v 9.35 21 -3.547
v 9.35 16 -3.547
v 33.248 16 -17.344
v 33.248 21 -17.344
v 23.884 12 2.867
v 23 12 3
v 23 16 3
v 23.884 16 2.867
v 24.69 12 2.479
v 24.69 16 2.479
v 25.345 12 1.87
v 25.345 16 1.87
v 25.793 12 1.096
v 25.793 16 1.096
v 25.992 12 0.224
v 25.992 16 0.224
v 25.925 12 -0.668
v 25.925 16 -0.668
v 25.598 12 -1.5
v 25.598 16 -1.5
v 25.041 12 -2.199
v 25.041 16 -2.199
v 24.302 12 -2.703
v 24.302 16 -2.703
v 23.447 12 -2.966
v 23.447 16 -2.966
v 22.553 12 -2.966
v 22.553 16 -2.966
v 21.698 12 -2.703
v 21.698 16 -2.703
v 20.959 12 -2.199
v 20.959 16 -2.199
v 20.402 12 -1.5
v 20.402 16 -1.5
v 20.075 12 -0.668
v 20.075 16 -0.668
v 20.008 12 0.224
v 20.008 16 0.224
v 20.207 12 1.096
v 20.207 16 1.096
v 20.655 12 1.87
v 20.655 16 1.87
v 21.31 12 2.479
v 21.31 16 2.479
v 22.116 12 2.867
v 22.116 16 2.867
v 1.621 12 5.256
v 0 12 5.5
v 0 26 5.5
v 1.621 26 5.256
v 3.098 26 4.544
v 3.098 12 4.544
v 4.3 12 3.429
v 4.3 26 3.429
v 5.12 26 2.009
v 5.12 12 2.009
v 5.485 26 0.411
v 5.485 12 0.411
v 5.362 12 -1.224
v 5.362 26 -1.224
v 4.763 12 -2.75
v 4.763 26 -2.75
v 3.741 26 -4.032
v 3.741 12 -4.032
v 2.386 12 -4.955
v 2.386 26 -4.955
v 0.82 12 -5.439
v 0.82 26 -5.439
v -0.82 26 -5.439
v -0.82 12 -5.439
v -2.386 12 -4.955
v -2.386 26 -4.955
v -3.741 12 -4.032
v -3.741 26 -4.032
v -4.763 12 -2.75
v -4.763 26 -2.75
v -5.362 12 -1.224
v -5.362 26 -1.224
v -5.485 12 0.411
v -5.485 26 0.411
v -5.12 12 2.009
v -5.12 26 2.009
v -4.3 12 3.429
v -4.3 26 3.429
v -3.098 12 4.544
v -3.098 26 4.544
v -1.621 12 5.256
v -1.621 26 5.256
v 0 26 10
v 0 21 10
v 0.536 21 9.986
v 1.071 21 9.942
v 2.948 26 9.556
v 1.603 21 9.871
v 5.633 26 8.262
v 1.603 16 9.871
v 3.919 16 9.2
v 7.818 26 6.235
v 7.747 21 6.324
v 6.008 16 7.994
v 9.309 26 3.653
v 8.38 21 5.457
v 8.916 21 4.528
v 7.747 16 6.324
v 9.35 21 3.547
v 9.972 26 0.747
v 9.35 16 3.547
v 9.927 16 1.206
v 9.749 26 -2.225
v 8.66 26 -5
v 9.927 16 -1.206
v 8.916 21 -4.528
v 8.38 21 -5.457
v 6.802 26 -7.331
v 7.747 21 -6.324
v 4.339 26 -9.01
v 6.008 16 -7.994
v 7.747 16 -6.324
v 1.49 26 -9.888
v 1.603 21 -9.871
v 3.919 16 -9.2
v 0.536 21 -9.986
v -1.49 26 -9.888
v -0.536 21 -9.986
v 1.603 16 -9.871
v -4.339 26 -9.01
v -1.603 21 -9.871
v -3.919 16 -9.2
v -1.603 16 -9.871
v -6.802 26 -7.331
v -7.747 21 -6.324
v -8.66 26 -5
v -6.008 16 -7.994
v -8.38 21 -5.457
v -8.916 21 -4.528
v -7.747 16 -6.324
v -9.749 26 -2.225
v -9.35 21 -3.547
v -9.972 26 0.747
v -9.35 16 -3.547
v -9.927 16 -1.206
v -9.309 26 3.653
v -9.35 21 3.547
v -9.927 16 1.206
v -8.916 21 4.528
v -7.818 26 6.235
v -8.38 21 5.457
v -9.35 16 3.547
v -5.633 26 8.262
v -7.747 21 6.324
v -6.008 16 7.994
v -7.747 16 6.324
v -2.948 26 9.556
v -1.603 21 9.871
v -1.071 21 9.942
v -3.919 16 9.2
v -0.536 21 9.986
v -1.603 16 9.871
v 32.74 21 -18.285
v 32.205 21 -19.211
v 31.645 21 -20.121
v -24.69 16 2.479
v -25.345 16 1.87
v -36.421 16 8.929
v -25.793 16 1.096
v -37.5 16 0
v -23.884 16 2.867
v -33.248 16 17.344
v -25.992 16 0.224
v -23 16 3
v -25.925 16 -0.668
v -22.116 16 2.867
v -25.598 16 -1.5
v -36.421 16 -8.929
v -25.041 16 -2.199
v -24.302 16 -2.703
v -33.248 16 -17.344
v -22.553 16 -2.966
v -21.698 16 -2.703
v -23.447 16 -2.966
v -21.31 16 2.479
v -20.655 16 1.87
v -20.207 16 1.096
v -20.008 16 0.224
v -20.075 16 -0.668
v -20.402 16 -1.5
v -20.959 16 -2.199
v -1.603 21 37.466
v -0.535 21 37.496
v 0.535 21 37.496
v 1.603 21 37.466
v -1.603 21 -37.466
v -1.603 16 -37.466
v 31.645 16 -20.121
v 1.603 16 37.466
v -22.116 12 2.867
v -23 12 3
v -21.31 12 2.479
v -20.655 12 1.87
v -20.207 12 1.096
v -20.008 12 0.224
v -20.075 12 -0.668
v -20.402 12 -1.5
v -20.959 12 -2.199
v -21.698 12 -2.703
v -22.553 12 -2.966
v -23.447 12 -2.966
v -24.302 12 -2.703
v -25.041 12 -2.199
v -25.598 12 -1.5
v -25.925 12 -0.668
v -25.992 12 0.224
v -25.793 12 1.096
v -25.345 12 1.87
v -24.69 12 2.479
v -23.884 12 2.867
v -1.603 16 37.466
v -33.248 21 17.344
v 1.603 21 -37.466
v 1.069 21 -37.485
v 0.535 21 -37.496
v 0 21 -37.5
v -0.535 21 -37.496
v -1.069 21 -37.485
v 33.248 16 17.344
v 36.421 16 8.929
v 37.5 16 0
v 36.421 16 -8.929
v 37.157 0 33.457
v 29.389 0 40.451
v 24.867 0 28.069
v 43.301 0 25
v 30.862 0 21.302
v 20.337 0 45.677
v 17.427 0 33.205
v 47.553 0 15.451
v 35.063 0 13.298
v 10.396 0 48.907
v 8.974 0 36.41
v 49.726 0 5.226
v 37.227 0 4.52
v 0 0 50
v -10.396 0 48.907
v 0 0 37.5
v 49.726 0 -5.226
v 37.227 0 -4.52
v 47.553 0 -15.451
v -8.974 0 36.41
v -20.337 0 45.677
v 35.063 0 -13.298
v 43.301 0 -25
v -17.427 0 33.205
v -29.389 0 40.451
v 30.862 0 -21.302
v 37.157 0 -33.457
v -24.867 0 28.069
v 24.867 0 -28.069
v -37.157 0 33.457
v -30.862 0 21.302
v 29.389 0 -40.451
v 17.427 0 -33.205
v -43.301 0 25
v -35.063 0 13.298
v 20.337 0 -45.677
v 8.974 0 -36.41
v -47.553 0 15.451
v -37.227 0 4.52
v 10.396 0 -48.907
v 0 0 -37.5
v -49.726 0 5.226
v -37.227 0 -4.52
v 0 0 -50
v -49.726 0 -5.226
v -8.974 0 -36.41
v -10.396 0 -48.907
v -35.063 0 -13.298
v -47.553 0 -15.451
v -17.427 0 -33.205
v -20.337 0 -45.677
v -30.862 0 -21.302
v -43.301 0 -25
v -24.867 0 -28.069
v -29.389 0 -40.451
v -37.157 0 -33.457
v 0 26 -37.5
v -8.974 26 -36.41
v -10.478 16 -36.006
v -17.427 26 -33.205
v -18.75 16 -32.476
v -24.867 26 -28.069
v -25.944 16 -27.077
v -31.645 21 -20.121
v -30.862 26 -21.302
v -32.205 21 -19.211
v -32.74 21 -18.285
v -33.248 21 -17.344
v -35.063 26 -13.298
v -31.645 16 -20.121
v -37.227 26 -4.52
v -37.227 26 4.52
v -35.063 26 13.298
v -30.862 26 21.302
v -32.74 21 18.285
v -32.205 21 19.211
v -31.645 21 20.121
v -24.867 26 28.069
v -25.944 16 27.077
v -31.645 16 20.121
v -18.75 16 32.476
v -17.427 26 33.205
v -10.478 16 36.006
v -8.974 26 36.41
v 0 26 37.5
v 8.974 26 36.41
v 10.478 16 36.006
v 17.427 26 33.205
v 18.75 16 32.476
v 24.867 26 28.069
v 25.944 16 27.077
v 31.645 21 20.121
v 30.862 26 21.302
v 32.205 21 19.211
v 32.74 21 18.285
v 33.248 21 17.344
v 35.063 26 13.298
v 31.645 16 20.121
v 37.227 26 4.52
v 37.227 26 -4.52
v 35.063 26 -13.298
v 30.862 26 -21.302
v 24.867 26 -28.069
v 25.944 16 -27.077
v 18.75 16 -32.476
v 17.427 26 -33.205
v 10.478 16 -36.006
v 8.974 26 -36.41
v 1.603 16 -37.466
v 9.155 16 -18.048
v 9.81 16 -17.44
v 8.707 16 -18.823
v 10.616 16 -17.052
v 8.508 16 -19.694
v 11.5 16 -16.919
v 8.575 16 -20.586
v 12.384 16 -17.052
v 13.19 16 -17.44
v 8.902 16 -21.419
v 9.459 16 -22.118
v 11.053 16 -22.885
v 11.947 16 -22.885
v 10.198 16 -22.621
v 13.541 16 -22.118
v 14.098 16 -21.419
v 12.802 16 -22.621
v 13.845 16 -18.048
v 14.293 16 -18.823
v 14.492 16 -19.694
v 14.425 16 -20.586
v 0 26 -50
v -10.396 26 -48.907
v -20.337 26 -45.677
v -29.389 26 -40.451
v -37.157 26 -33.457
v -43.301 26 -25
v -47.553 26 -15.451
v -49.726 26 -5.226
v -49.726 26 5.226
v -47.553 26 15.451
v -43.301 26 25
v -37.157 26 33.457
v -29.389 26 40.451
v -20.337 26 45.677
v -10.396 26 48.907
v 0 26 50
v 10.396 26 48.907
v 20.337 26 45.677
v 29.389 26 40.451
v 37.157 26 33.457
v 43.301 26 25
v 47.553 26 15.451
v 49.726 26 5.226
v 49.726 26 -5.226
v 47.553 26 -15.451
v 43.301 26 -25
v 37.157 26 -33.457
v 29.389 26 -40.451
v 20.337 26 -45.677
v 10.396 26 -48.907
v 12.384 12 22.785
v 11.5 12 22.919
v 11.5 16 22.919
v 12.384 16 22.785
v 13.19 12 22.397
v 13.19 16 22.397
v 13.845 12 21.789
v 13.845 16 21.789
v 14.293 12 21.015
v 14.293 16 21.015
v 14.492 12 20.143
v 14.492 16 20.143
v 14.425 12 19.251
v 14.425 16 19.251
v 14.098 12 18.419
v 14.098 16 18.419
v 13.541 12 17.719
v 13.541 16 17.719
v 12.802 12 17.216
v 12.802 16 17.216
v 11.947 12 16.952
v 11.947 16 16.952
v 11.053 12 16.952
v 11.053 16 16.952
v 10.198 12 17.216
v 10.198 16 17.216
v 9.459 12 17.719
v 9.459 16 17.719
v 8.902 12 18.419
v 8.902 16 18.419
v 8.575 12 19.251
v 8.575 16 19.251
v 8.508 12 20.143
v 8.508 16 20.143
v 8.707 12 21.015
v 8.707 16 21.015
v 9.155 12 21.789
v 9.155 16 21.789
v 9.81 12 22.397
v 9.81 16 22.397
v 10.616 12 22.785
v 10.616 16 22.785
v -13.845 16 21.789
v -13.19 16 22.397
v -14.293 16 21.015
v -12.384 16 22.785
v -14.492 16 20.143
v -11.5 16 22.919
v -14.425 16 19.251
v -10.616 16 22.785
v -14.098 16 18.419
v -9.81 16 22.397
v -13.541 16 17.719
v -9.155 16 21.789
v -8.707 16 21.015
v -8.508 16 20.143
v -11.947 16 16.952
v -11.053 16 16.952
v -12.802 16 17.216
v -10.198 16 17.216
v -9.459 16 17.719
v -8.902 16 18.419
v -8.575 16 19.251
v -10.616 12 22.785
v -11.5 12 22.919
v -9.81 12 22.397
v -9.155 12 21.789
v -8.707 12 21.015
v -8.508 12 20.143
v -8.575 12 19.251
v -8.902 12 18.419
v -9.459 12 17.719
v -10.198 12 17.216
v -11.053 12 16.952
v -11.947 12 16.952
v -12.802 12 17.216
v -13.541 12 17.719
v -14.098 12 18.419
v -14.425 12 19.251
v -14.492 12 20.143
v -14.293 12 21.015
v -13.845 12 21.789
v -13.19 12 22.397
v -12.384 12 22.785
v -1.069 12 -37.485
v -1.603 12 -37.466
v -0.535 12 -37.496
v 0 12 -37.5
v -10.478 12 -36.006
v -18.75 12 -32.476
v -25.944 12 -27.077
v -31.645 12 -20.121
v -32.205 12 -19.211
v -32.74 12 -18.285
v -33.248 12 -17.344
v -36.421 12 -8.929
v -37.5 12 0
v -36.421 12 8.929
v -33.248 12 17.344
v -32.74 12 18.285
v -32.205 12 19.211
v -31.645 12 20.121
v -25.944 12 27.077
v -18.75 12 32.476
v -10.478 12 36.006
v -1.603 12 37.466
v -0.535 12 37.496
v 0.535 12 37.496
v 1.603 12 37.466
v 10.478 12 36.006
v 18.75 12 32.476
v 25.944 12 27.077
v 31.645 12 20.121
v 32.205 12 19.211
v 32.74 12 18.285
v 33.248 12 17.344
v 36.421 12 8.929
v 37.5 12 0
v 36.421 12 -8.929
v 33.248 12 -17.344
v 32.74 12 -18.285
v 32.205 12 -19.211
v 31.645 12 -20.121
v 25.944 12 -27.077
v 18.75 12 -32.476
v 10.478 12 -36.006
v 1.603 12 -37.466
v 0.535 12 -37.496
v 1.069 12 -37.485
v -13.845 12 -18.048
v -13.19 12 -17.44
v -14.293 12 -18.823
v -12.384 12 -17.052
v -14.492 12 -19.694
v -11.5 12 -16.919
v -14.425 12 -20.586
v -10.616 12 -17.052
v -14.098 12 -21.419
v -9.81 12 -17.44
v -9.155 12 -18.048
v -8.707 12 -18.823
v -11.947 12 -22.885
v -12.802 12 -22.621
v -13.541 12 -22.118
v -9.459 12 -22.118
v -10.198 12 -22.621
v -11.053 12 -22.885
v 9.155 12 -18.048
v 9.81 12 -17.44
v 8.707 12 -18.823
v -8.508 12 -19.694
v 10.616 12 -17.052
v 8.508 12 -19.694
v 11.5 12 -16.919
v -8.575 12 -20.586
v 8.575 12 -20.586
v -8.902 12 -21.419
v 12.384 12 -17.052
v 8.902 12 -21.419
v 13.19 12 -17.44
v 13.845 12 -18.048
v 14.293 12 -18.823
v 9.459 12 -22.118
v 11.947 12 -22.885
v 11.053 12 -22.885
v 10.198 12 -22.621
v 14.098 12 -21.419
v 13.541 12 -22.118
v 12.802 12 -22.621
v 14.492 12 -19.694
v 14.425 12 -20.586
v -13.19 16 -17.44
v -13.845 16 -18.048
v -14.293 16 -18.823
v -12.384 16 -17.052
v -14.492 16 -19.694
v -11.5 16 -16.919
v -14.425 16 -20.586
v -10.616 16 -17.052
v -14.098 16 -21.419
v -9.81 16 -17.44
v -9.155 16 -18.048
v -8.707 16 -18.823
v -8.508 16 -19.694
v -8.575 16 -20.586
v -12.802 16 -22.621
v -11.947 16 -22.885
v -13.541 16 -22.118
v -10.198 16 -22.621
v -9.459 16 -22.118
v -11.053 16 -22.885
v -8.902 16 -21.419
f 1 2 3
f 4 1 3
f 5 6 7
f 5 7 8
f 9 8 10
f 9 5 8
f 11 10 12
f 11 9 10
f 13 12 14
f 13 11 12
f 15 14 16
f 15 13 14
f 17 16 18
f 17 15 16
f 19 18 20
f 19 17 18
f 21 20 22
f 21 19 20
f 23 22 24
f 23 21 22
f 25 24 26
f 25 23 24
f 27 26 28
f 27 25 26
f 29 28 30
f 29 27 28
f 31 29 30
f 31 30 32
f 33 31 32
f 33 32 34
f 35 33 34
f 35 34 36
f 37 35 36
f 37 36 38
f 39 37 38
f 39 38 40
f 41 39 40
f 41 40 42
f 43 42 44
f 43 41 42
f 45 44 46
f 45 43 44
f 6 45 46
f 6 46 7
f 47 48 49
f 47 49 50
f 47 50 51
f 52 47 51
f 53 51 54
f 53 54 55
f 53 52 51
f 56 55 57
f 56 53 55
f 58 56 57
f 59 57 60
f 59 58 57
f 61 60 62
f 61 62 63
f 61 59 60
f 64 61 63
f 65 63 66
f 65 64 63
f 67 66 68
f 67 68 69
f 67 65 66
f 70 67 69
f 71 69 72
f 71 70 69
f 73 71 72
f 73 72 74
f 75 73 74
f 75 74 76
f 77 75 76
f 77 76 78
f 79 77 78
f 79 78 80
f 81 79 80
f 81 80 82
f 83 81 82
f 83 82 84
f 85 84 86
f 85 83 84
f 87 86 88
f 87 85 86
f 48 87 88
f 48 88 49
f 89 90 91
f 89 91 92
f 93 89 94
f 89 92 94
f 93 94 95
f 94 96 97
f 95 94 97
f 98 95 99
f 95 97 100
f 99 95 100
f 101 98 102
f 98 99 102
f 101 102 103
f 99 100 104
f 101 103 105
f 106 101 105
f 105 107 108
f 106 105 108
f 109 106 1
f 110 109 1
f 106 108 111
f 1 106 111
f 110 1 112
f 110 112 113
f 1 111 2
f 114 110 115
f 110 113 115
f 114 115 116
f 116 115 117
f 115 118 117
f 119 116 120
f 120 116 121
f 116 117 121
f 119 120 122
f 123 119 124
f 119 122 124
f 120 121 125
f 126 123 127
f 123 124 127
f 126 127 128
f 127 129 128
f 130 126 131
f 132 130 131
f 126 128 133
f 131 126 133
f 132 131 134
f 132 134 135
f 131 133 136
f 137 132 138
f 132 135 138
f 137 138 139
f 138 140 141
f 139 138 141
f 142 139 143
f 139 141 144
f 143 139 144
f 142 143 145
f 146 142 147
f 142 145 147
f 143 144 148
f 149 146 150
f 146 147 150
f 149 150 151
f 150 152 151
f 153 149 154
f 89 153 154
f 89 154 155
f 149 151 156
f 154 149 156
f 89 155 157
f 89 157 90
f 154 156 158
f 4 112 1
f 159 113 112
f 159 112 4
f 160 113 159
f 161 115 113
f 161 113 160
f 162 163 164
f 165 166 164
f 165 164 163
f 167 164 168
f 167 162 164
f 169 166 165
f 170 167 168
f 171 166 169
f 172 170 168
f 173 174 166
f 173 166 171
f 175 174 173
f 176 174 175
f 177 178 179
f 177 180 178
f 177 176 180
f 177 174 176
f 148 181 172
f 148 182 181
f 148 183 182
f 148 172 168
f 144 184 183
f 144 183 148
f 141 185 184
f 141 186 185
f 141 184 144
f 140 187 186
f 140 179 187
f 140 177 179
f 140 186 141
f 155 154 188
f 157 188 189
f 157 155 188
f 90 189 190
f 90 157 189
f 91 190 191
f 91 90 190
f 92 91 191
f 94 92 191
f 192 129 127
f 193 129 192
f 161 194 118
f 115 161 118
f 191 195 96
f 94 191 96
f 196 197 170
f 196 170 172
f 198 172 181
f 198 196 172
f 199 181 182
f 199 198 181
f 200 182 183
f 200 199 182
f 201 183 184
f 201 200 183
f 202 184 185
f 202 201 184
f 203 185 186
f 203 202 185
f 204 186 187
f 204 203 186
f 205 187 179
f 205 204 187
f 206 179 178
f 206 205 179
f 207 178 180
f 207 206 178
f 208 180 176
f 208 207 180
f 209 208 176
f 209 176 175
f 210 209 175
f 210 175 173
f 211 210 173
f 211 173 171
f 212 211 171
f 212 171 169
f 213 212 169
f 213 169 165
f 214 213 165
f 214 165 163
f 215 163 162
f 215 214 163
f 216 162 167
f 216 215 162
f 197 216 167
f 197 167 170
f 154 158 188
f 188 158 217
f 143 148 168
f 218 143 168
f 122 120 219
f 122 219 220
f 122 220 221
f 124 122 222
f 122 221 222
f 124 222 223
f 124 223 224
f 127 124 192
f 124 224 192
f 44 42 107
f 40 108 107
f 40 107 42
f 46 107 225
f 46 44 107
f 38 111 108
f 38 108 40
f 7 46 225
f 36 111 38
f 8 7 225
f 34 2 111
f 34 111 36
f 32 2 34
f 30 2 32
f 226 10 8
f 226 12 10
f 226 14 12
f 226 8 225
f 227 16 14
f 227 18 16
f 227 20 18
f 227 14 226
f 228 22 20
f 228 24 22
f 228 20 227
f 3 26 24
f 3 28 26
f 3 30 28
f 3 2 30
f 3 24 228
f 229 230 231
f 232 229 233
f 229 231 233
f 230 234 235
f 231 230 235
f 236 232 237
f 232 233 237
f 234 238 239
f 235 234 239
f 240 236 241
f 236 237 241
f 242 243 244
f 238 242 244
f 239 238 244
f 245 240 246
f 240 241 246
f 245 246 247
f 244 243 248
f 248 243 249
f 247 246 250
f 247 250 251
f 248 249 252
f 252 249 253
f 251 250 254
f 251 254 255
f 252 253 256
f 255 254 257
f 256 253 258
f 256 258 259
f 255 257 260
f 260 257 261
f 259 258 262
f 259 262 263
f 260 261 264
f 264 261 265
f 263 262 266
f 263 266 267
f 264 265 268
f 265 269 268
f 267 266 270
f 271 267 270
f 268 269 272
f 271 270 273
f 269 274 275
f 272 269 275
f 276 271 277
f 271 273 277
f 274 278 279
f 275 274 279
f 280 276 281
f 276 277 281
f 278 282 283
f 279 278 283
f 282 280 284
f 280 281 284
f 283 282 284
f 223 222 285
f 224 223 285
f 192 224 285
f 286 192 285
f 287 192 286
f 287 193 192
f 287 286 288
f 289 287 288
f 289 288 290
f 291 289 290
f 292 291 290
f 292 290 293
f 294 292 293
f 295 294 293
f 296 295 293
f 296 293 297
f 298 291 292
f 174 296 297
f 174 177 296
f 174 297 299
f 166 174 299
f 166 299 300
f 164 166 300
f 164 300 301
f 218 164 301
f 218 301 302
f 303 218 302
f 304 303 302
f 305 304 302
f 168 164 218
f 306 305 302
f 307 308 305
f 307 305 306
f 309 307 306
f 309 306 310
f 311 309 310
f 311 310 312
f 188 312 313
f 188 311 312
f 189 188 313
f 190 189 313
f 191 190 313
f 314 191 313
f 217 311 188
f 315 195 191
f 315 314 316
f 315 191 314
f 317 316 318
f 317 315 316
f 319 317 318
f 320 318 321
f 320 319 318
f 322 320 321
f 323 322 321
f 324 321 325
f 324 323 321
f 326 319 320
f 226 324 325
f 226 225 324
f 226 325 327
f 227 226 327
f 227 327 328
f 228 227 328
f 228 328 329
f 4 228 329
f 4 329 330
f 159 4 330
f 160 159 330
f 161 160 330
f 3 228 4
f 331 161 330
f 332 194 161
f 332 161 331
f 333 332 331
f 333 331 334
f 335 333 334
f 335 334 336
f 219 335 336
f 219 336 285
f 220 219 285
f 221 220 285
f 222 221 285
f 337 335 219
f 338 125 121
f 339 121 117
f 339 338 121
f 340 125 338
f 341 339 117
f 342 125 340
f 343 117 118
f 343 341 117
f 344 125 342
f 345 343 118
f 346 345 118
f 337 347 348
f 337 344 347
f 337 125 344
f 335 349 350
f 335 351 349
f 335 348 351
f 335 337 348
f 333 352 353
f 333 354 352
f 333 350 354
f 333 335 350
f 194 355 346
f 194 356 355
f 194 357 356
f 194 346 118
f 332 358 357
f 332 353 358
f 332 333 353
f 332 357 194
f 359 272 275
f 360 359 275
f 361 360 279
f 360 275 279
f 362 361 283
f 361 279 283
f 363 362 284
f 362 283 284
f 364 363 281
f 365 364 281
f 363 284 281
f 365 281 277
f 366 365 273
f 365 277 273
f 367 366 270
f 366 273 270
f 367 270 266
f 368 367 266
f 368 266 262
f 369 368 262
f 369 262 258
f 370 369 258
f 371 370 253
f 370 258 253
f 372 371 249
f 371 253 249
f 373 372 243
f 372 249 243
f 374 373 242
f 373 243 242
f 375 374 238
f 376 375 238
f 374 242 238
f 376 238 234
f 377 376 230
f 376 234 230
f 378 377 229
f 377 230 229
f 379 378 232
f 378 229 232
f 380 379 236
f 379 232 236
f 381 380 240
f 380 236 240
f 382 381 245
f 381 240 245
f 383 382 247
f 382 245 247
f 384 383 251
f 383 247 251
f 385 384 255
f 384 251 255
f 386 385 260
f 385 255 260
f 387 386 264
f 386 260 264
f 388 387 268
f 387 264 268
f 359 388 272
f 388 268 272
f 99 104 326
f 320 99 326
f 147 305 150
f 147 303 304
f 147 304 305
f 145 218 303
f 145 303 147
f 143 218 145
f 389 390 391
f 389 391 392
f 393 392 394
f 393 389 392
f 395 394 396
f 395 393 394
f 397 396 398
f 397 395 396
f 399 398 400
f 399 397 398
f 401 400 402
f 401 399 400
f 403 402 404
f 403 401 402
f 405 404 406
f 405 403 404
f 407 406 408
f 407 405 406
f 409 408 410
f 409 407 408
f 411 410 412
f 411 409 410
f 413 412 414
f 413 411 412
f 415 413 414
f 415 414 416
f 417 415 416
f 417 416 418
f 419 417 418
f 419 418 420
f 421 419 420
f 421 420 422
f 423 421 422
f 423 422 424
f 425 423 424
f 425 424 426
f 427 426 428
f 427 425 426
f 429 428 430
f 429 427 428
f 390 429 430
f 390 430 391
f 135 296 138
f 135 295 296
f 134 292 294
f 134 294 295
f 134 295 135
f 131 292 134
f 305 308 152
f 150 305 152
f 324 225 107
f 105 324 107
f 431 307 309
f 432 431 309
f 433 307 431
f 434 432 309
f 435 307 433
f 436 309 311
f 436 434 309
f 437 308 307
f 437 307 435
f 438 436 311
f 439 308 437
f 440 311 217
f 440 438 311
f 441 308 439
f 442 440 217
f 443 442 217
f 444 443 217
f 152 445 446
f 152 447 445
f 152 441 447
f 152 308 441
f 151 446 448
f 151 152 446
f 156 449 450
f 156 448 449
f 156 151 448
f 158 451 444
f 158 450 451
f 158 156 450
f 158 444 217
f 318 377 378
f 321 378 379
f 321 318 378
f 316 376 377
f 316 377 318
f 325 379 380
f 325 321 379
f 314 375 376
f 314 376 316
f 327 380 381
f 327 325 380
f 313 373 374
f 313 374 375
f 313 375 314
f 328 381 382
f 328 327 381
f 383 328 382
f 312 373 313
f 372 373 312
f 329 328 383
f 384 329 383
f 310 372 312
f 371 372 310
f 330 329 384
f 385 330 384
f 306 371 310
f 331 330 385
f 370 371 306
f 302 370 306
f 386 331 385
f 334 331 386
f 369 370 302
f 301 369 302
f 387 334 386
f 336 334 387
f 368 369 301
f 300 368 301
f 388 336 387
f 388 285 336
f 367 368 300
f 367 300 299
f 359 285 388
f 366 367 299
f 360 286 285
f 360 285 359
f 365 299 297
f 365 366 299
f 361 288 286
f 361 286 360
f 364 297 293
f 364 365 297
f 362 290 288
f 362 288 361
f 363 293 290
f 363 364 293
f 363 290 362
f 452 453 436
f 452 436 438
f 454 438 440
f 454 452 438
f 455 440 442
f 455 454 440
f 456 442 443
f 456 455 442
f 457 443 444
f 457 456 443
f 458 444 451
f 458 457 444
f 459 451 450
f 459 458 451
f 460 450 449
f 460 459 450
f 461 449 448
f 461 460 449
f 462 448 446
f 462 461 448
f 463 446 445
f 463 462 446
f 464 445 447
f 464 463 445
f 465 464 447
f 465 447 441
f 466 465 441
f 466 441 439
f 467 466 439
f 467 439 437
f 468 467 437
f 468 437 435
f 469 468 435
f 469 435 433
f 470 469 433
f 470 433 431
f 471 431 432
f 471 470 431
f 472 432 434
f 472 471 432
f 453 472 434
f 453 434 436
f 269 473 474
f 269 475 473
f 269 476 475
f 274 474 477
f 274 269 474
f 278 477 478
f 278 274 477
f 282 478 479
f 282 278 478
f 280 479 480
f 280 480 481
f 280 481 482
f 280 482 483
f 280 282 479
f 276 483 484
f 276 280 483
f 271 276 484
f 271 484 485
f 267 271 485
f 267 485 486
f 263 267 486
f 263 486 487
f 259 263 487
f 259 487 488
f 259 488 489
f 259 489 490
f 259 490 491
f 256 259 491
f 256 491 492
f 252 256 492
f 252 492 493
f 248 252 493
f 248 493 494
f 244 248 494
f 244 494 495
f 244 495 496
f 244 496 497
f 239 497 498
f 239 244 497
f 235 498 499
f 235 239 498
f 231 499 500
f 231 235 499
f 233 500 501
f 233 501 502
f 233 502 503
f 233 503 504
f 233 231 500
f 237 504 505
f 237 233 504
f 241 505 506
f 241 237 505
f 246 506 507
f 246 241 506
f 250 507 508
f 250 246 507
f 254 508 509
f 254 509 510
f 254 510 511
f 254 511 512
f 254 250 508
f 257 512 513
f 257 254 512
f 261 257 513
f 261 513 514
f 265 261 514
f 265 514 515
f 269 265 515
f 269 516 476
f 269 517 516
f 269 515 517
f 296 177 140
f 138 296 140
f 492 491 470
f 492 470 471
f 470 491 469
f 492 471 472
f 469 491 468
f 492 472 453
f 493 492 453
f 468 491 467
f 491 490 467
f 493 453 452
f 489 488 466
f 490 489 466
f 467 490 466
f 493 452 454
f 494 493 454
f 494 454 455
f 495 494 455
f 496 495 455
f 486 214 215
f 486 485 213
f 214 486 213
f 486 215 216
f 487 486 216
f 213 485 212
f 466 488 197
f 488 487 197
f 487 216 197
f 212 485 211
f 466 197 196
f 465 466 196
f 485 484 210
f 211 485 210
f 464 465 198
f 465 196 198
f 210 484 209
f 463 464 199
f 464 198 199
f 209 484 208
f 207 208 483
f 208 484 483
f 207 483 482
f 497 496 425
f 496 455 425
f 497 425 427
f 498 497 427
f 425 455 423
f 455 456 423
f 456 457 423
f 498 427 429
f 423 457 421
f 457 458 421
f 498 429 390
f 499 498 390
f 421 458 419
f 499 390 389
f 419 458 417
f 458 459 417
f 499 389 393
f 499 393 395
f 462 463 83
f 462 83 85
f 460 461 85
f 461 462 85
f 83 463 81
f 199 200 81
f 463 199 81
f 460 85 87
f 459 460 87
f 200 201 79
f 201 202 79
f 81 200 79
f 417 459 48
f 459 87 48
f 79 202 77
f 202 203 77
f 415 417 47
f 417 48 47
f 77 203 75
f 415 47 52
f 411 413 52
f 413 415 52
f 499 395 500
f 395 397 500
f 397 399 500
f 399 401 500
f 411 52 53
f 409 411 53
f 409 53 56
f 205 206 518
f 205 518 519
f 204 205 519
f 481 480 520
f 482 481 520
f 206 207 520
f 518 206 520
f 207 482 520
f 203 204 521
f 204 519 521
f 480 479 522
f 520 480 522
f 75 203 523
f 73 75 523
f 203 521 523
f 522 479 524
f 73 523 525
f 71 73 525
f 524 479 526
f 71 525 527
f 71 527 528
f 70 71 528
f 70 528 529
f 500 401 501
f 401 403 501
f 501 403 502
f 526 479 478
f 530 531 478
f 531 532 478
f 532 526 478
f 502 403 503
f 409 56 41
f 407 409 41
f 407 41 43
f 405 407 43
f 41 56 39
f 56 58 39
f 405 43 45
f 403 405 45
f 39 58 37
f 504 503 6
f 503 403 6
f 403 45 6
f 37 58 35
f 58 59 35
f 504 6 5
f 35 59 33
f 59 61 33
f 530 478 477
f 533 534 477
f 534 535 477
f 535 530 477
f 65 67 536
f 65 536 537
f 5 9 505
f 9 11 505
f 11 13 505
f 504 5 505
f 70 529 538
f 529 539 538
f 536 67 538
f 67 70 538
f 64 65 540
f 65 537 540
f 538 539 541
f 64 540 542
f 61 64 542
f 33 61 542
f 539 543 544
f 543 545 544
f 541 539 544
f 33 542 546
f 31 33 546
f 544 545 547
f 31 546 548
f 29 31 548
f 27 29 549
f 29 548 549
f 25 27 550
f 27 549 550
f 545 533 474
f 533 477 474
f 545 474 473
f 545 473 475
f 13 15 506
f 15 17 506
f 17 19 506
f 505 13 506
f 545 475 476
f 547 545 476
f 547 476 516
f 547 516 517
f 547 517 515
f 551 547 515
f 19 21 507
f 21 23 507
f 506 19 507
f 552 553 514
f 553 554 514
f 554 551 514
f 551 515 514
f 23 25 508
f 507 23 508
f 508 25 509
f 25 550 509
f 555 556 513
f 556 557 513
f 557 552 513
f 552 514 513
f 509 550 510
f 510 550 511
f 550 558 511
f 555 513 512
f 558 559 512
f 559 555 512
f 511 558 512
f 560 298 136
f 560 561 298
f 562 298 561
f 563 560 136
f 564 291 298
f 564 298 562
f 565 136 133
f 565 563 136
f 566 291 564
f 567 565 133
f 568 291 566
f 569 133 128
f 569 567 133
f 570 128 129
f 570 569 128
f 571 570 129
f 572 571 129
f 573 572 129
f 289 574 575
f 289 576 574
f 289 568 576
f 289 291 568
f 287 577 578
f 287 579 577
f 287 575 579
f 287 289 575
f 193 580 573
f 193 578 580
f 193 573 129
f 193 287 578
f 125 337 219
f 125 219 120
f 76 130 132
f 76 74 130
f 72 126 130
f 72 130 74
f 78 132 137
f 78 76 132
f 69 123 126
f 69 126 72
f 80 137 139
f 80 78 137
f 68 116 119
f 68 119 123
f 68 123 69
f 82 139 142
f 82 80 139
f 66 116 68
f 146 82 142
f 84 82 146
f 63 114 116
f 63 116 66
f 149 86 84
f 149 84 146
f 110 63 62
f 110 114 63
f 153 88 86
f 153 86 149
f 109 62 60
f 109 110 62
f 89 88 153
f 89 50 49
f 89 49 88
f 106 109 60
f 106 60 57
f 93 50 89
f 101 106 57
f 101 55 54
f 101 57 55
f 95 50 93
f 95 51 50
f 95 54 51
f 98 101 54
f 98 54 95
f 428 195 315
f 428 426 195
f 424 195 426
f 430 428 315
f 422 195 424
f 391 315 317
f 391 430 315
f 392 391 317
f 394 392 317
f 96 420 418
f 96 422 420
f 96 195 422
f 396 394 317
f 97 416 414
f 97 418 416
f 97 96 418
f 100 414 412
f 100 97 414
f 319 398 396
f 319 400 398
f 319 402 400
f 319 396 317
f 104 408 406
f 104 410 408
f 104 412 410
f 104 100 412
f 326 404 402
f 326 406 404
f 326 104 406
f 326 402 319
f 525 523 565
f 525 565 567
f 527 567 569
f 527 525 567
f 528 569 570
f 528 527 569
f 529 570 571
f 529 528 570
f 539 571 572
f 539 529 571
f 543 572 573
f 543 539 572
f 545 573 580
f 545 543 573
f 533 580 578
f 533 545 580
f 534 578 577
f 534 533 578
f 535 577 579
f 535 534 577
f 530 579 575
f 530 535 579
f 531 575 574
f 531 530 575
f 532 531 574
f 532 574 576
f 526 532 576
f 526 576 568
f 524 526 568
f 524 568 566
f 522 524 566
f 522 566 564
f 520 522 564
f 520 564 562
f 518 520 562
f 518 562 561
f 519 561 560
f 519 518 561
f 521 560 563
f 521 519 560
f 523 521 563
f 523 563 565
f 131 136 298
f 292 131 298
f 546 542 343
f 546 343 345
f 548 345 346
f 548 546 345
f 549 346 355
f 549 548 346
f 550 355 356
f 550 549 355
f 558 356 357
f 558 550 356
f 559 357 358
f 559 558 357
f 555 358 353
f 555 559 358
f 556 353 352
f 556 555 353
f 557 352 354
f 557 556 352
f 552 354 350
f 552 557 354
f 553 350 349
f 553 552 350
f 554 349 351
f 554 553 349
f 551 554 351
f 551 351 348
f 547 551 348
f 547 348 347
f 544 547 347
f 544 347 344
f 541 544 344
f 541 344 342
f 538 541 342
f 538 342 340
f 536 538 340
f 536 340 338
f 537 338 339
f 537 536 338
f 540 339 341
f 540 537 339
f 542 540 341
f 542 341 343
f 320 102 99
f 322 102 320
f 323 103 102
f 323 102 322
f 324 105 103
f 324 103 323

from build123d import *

# Parameters (mm, degrees)
SKETCH1_R           = 50
SKETCH1_R_2         = 37.5
BOSS_EXTRUDE1_DEPTH = 26
BOSS_EXTRUDE3_DEPTH = 9
BOSS_EXTRUDE4_START = -14
SKETCH9_R           = 10
SKETCH9_R_2         = 5.5
BOSS_EXTRUDE4_DEPTH = 14
SKETCH10_R          = 3
BOSS_EXTRUDE5_DEPTH = 4


with BuildPart() as part:
    # Sketch1 → Boss-Extrude1 (new body)
    with BuildSketch(Plane(origin=(0, 0, 0), x_dir=(1, 0, 0), z_dir=(0, 1, 0))):
        with Locations(Location((0, 0, 0), (0, 0, 90))):
            Circle(SKETCH1_R)
        with Locations(Location((0, 0, 0), (0, 0, 90))):
            Circle(SKETCH1_R_2, mode=Mode.SUBTRACT)
    extrude(amount=BOSS_EXTRUDE1_DEPTH)

    # Sketch3 → Boss-Extrude3 (add)
    with BuildSketch(Plane(origin=(0, 12, 0), x_dir=(1, 0, 0), z_dir=(0, 1, 0))):
        with BuildLine():
            Line((1.603162061, 37.465715947), (1.603162061, 9.870657091))
            ThreePointArc((1.603162061, 9.870657091), (0, 10), (-1.603162061, 9.870657091))
            Line((-1.603162061, 9.870657091), (-1.603162061, 37.465715947))
            ThreePointArc((-1.603162061, 37.465715947), (0, 37.5), (1.603162061, 37.465715947))
        make_face()
        with BuildLine():
            Line((31.64468075, 20.121237045), (7.746658762, 6.323707617))
            ThreePointArc((7.746658762, 6.323707617), (8.660254038, 5), (9.349820823, 3.546949474))
            Line((9.349820823, 3.546949474), (33.247842811, 17.344478902))
            ThreePointArc((33.247842811, 17.344478902), (32.475952642, 18.75), (31.64468075, 20.121237045))
        make_face()
        with BuildLine():
            Line((33.247842811, -17.344478902), (9.349820823, -3.546949474))
            ThreePointArc((9.349820823, -3.546949474), (8.660254038, -5), (7.746658762, -6.323707617))
            Line((7.746658762, -6.323707617), (31.64468075, -20.121237045))
            ThreePointArc((31.64468075, -20.121237045), (32.475952642, -18.75), (33.247842811, -17.344478902))
        make_face()
        with BuildLine():
            Line((1.603162061, -37.465715947), (1.603162061, -9.870657091))
            ThreePointArc((1.603162061, -9.870657091), (0, -10), (-1.603162061, -9.870657091))
            Line((-1.603162061, -9.870657091), (-1.603162061, -37.465715947))
            ThreePointArc((-1.603162061, -37.465715947), (0, -37.5), (1.603162061, -37.465715947))
        make_face()
        with BuildLine():
            Line((-31.64468075, -20.121237045), (-7.746658762, -6.323707617))
            ThreePointArc((-7.746658762, -6.323707617), (-8.660254038, -5), (-9.349820823, -3.546949474))
            Line((-9.349820823, -3.546949474), (-33.247842811, -17.344478902))
            ThreePointArc((-33.247842811, -17.344478902), (-32.475952642, -18.75), (-31.64468075, -20.121237045))
        make_face()
        with BuildLine():
            Line((-33.247842811, 17.344478902), (-9.349820823, 3.546949474))
            ThreePointArc((-9.349820823, 3.546949474), (-8.660254038, 5), (-7.746658762, 6.323707617))
            Line((-7.746658762, 6.323707617), (-31.64468075, 20.121237045))
            ThreePointArc((-31.64468075, 20.121237045), (-32.475952642, 18.75), (-33.247842811, 17.344478902))
        make_face()
    extrude(amount=BOSS_EXTRUDE3_DEPTH)

    # Sketch9 → Boss-Extrude4 (add)
    with BuildSketch(Plane(origin=(0, 26, 0), x_dir=(1, 0, 0), z_dir=(0, 1, 0)).offset(BOSS_EXTRUDE4_START)):
        with Locations(Location((0, 0, 0), (0, 0, 270))):
            Circle(SKETCH9_R)
        with Locations(Location((0, 0, 0), (0, 0, 270))):
            Circle(SKETCH9_R_2, mode=Mode.SUBTRACT)
    extrude(amount=BOSS_EXTRUDE4_DEPTH)

    # Sketch10 → Boss-Extrude5 (add)
    # profile 1 of 6: a face of its own
    with BuildSketch(Plane(origin=(0, 12, 0), x_dir=(1, 0, 0), z_dir=(0, 1, 0))):
        with BuildLine():
            Line((7.746658762, 6.323707617), (31.64468075, 20.121237045))
            ThreePointArc((31.64468075, 20.121237045), (18.75, 32.475952642), (1.603162061, 37.465715947))
            Line((1.603162061, 37.465715947), (1.603162061, 9.870657091))
            ThreePointArc((1.603162061, 9.870657091), (5, 8.660254038), (7.746658762, 6.323707617))
        make_face()
        with Locations(Location((11.5, 19.918584287, 0), (0, 0, 270))):
            Circle(SKETCH10_R, mode=Mode.SUBTRACT)
    # profile 2 of 6: a face of its own
    with BuildSketch(Plane(origin=(0, 12, 0), x_dir=(1, 0, 0), z_dir=(0, 1, 0))):
        with BuildLine():
            Line((33.247842811, 17.344478902), (9.349820823, 3.546949474))
            ThreePointArc((9.349820823, 3.546949474), (10, 0), (9.349820823, -3.546949474))
            Line((9.349820823, -3.546949474), (33.247842811, -17.344478902))
            ThreePointArc((33.247842811, -17.344478902), (37.5, 0), (33.247842811, 17.344478902))
        make_face()
        with Locations(Location((23, 0, 0), (0, 0, 270))):
            Circle(SKETCH10_R, mode=Mode.SUBTRACT)
    # profile 3 of 6: a face of its own
    with BuildSketch(Plane(origin=(0, 12, 0), x_dir=(1, 0, 0), z_dir=(0, 1, 0))):
        with BuildLine():
            Line((31.64468075, -20.121237045), (7.746658762, -6.323707617))
            ThreePointArc((7.746658762, -6.323707617), (5, -8.660254038), (1.603162061, -9.870657091))
            Line((1.603162061, -9.870657091), (1.603162061, -37.465715947))
            ThreePointArc((1.603162061, -37.465715947), (18.75, -32.475952642), (31.64468075, -20.121237045))
        make_face()
        with Locations(Location((11.5, -19.918584287, 0), (0, 0, 270))):
            Circle(SKETCH10_R, mode=Mode.SUBTRACT)
    # profile 4 of 6: a face of its own
    with BuildSketch(Plane(origin=(0, 12, 0), x_dir=(1, 0, 0), z_dir=(0, 1, 0))):
        with BuildLine():
            Line((-1.603162061, -37.465715947), (-1.603162061, -9.870657091))
            ThreePointArc((-1.603162061, -9.870657091), (-5, -8.660254038), (-7.746658762, -6.323707617))
            Line((-7.746658762, -6.323707617), (-31.64468075, -20.121237045))
            ThreePointArc((-31.64468075, -20.121237045), (-18.75, -32.475952642), (-1.603162061, -37.465715947))
        make_face()
        with Locations(Location((-11.5, -19.918584287, 0), (0, 0, 270))):
            Circle(SKETCH10_R, mode=Mode.SUBTRACT)
    # profile 5 of 6: a face of its own
    with BuildSketch(Plane(origin=(0, 12, 0), x_dir=(1, 0, 0), z_dir=(0, 1, 0))):
        with BuildLine():
            Line((-33.247842811, -17.344478902), (-9.349820823, -3.546949474))
            ThreePointArc((-9.349820823, -3.546949474), (-10, 0), (-9.349820823, 3.546949474))
            Line((-9.349820823, 3.546949474), (-33.247842811, 17.344478902))
            ThreePointArc((-33.247842811, 17.344478902), (-37.5, 0), (-33.247842811, -17.344478902))
        make_face()
        with Locations(Location((-23, 0, 0), (0, 0, 270))):
            Circle(SKETCH10_R, mode=Mode.SUBTRACT)
    # profile 6 of 6: a face of its own
    with BuildSketch(Plane(origin=(0, 12, 0), x_dir=(1, 0, 0), z_dir=(0, 1, 0))):
        with BuildLine():
            Line((-31.64468075, 20.121237045), (-7.746658762, 6.323707617))
            ThreePointArc((-7.746658762, 6.323707617), (-5, 8.660254038), (-1.603162061, 9.870657091))
            Line((-1.603162061, 9.870657091), (-1.603162061, 37.465715947))
            ThreePointArc((-1.603162061, 37.465715947), (-18.75, 32.475952642), (-31.64468075, 20.121237045))
        make_face()
        with Locations(Location((-11.5, 19.918584287, 0), (0, 0, 270))):
            Circle(SKETCH10_R, mode=Mode.SUBTRACT)
    extrude(amount=BOSS_EXTRUDE5_DEPTH)


solid = part.part
